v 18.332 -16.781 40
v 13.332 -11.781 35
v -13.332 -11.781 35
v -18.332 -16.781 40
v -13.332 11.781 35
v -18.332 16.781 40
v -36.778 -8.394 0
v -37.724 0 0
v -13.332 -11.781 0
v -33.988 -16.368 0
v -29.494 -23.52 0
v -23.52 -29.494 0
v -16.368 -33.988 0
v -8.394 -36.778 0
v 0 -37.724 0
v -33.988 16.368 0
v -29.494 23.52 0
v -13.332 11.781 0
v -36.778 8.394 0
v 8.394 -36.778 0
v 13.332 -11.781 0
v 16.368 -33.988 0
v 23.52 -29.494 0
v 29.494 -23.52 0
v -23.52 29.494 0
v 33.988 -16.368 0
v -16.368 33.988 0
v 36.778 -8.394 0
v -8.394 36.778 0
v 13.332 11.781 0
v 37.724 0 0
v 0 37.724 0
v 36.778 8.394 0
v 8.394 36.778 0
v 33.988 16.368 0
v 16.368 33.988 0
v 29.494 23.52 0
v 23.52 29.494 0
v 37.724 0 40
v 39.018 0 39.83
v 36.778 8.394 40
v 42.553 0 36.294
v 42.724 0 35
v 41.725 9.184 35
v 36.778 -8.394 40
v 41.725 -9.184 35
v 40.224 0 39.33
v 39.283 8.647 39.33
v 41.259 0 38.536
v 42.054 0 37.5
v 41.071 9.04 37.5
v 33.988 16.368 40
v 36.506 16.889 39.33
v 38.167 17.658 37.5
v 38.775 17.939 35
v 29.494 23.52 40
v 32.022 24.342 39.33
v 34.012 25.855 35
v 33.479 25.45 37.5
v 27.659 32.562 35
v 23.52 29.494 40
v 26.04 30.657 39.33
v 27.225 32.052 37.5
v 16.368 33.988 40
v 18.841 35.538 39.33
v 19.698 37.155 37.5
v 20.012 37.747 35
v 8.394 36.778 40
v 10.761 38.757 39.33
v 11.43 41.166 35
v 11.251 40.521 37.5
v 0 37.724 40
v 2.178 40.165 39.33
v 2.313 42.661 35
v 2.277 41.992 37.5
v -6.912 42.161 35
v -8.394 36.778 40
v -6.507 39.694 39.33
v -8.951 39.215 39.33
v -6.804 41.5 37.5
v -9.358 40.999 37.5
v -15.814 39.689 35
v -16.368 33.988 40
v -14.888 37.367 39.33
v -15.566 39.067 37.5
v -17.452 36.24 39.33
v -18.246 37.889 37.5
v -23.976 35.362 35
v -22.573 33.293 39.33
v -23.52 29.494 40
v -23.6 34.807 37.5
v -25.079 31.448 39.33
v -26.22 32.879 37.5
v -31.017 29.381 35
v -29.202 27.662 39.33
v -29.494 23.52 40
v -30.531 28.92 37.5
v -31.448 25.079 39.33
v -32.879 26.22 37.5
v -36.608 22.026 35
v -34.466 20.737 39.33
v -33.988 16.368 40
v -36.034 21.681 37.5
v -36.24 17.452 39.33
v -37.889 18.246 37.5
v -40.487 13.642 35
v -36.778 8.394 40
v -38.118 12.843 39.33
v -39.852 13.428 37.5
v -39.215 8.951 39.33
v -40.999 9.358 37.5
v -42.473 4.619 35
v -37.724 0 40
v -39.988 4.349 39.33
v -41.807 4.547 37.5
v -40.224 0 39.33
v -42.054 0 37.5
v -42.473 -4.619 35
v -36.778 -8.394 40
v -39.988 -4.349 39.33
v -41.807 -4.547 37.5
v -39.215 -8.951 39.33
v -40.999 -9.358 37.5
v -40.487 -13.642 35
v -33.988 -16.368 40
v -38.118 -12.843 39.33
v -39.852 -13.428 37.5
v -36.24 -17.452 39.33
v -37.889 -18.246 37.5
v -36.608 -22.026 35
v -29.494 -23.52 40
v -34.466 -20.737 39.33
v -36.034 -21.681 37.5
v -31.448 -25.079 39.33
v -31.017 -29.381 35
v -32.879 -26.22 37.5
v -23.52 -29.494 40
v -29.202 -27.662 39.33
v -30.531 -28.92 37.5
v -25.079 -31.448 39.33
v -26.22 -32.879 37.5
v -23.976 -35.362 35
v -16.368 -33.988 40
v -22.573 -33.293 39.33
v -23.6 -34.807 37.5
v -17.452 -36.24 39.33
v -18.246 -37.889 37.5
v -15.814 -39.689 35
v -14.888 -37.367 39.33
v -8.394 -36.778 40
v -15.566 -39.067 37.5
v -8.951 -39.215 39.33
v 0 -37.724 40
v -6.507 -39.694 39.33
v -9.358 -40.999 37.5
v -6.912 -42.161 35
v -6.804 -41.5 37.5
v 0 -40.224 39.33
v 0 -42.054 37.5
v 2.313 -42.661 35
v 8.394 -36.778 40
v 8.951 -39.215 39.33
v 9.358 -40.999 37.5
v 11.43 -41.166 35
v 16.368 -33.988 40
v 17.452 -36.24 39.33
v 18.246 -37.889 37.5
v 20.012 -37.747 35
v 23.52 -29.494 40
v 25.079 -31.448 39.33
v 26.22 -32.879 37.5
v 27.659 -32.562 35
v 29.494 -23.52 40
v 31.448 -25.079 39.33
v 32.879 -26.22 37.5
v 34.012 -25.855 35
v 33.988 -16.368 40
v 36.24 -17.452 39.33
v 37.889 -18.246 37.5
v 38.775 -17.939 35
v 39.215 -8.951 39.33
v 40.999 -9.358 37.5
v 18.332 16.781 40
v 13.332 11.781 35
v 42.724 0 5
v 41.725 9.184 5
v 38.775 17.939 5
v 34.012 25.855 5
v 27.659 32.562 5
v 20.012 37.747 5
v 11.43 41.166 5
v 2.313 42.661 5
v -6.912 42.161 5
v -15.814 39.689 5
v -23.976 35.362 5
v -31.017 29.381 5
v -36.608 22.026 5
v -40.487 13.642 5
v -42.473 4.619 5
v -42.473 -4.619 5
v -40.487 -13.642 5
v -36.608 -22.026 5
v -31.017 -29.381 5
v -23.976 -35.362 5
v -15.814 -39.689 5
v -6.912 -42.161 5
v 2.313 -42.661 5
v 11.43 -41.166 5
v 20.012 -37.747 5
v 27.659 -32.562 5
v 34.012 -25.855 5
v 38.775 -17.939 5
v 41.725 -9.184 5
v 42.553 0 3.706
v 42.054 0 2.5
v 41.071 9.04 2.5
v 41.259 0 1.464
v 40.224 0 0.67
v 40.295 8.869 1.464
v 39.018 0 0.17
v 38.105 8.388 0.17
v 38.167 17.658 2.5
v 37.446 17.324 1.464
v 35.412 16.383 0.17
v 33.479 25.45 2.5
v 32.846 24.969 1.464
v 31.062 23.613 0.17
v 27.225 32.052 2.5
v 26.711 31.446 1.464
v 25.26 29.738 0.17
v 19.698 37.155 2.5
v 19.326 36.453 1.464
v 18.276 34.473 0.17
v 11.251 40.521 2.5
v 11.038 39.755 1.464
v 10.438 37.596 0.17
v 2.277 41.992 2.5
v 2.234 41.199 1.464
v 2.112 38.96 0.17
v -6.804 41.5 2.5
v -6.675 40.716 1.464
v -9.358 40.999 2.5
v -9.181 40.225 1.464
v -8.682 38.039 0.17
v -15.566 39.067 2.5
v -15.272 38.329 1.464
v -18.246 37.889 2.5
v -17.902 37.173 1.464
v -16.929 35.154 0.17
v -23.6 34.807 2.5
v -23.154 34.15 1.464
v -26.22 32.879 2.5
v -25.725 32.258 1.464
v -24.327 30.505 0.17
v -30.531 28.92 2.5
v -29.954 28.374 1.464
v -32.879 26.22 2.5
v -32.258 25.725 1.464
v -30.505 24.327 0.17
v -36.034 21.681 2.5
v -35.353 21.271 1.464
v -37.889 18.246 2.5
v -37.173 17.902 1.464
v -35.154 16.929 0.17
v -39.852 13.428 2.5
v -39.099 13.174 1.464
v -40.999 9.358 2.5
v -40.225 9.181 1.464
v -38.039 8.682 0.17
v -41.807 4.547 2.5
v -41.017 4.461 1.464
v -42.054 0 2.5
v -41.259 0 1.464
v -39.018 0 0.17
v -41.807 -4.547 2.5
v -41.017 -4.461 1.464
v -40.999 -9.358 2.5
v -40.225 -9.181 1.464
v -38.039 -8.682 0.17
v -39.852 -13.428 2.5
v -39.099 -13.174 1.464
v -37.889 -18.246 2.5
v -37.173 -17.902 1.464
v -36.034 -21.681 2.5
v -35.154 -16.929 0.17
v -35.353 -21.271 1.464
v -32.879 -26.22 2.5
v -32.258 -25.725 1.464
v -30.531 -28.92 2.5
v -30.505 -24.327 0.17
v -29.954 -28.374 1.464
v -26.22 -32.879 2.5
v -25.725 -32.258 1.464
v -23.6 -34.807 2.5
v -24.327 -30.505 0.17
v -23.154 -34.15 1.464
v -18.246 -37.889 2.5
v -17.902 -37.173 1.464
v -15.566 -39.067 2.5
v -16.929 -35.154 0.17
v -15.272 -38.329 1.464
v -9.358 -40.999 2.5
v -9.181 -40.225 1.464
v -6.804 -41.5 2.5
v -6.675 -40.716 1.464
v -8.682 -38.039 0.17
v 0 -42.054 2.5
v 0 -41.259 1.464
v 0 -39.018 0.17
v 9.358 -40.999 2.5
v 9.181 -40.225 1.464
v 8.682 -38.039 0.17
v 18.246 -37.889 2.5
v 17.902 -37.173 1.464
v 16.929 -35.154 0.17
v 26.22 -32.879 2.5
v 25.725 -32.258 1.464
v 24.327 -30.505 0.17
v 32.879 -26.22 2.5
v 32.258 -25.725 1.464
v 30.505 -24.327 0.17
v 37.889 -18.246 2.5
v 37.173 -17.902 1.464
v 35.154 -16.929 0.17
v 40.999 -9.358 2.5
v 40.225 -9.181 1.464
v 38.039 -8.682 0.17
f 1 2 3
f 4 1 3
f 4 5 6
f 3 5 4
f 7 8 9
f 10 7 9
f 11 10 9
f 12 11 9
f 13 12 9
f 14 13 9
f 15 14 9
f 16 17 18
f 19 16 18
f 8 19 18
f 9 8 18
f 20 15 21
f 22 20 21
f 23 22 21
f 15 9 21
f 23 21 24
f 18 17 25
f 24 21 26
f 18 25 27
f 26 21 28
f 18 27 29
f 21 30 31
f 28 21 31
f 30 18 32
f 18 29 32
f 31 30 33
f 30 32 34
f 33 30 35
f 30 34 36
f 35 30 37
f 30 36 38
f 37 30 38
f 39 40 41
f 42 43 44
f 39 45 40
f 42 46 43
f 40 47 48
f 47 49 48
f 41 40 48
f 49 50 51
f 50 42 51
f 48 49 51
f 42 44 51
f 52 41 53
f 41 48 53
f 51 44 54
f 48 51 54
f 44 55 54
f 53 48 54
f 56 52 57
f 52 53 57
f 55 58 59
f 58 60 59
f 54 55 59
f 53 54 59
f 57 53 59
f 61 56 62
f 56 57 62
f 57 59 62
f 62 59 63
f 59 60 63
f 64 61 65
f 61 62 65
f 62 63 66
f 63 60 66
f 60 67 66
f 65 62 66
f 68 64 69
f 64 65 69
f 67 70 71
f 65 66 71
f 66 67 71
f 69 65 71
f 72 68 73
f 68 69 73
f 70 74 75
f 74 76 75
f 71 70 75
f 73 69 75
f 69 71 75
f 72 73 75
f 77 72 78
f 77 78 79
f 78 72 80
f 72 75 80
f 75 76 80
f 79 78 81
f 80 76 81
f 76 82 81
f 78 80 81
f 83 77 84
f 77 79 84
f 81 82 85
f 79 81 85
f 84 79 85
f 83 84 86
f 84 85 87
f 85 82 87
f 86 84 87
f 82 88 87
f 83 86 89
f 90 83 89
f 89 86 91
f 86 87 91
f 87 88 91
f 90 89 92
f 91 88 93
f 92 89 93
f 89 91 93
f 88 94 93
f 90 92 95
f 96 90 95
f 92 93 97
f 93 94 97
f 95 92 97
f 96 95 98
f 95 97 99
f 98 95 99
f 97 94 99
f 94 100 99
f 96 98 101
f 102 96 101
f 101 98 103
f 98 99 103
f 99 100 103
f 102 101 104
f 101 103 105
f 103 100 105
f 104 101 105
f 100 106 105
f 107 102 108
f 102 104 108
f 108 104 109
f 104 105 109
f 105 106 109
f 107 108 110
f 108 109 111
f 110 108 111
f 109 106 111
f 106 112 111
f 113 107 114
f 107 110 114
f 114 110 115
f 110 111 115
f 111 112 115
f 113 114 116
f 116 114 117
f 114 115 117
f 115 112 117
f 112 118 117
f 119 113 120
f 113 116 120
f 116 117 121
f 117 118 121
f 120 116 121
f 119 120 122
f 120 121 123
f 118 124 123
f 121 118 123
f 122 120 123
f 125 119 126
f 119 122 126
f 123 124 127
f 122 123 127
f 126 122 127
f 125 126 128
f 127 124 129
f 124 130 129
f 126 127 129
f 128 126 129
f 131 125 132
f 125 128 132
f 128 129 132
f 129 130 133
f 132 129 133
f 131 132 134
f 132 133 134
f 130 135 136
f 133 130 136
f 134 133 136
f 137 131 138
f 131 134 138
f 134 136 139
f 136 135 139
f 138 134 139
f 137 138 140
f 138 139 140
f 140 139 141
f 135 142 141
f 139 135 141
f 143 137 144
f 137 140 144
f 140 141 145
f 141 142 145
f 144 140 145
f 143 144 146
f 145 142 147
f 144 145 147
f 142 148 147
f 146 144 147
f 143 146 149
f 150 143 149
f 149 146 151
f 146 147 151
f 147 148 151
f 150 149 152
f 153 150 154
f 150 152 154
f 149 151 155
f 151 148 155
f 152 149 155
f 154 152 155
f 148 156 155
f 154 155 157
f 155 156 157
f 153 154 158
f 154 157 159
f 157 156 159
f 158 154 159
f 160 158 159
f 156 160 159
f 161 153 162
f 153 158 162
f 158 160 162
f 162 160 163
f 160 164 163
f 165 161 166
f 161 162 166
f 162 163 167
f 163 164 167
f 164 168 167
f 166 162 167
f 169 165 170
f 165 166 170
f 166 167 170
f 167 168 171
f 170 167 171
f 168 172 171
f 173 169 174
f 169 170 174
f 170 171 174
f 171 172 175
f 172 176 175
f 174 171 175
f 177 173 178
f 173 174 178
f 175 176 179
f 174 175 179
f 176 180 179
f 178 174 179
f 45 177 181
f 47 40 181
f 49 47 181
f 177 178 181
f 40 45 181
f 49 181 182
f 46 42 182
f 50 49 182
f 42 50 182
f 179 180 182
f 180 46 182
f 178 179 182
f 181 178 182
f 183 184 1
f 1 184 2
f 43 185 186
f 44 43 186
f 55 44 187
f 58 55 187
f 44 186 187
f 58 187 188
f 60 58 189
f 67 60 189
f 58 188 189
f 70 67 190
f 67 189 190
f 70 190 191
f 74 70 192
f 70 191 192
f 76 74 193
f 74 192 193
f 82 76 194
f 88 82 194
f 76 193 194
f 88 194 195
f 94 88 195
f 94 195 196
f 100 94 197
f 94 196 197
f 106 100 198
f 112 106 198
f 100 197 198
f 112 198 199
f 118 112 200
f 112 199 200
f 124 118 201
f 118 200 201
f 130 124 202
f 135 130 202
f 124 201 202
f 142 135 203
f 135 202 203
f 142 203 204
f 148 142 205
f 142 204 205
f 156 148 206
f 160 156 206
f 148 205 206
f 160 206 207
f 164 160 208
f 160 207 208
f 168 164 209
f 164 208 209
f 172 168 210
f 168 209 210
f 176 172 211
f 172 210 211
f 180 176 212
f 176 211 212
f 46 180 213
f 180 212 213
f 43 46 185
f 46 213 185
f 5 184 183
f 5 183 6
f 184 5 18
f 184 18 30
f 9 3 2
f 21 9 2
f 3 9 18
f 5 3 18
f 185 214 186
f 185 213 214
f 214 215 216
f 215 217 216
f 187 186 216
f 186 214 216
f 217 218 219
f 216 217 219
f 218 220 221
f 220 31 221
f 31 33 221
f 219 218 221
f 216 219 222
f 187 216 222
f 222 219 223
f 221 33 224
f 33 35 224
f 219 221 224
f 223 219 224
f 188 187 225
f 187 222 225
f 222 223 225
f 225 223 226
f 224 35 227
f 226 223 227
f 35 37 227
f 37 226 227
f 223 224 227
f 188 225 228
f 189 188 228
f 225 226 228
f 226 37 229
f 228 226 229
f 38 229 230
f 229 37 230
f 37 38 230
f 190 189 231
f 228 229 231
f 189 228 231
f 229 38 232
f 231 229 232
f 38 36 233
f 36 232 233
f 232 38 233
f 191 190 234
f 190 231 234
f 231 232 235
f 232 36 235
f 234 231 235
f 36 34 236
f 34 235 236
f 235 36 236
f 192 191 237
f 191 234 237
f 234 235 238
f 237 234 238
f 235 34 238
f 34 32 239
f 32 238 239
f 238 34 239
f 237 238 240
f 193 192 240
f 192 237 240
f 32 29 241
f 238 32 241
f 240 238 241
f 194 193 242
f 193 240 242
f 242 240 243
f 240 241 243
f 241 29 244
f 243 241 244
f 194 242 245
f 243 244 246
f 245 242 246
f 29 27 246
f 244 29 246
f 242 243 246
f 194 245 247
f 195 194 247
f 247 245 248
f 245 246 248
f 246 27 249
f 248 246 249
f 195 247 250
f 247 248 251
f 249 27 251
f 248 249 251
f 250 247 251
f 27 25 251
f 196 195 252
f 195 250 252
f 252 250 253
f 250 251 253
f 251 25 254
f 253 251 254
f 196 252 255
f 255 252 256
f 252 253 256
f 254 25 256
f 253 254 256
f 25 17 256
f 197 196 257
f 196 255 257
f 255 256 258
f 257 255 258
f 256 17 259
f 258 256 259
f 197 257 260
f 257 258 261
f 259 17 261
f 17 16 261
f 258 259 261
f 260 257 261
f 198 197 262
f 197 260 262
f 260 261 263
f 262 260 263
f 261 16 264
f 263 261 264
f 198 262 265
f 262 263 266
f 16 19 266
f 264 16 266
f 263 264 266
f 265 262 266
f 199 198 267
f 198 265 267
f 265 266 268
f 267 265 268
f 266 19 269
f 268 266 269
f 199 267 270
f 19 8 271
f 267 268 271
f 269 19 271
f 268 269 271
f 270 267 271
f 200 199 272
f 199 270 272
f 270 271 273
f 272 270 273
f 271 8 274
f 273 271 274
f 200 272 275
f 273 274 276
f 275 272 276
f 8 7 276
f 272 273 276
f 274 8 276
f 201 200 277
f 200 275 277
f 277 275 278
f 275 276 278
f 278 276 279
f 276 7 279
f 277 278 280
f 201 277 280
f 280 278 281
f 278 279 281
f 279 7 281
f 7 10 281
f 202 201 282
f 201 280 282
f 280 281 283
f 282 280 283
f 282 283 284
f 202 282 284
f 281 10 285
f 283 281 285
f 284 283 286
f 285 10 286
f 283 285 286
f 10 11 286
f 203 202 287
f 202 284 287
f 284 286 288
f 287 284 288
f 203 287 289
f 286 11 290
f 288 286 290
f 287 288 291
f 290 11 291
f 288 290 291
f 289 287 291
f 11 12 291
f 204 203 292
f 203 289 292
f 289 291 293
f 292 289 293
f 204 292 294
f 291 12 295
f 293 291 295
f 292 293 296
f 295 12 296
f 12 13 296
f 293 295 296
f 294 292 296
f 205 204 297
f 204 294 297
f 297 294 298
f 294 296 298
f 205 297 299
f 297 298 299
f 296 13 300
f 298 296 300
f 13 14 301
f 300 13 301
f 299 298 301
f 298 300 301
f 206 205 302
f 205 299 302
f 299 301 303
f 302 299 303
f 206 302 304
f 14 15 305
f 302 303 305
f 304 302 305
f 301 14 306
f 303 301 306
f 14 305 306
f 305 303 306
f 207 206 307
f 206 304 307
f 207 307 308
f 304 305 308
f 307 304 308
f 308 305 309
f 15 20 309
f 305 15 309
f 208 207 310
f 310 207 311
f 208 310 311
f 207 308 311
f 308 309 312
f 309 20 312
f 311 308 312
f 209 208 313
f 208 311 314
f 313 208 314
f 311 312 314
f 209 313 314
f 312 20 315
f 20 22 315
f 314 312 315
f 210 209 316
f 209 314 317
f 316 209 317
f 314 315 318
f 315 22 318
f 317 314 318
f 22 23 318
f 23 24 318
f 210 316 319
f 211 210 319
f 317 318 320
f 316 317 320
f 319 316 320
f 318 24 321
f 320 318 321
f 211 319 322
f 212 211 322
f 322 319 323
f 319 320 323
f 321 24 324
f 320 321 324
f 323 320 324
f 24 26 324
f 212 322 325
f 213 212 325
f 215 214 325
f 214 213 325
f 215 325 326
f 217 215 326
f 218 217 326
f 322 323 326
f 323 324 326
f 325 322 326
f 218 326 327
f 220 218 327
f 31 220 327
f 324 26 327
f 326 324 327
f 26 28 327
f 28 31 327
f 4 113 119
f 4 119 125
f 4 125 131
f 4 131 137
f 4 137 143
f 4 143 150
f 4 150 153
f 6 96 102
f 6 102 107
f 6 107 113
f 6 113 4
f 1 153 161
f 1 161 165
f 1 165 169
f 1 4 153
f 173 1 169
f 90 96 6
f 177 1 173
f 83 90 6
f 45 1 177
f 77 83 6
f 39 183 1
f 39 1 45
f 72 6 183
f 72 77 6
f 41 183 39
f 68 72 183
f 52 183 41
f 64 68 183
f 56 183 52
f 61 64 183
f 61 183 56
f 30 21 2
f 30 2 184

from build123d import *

# Parameters (mm, degrees)
F0_R     = 42.723605
F1_DEPTH = 40
F2_W     = 26.663388
F2_H     = 23.562994
F3_DEPTH = 40.001
F4_SIZE  = 5
F5_R     = 5
F6_R     = 5


with BuildPart() as f1:
    # F0 (on Top) → F1 (new body)
    with BuildSketch(Plane.XY):
        Circle(F0_R)
    extrude(amount=F1_DEPTH)

    # F2 (on Top) → F3 (cut, through all)
    with BuildSketch(Plane.XY):
        Rectangle(F2_W, F2_H)
    extrude(amount=F3_DEPTH, mode=Mode.SUBTRACT)

    # F4
    f4_edges = [f1.edges().sort_by_distance(p)[0] for p in [
        (0, 11.781497, 40),
        (13.331694, 0, 40),
        (-13.331694, 0, 40),
        (0, -11.781497, 40),
    ]]
    chamfer(f4_edges, length=F4_SIZE)

    # F5
    f5_edges = [f1.edges().sort_by_distance(p)[0] for p in [
        (-42.723605, 0, 40),
    ]]
    fillet(f5_edges, radius=F5_R)

    # F6
    f6_edges = [f1.edges().sort_by_distance(p)[0] for p in [
        (-42.723605, 0, 0),
    ]]
    fillet(f6_edges, radius=F6_R)


solid = f1.part
